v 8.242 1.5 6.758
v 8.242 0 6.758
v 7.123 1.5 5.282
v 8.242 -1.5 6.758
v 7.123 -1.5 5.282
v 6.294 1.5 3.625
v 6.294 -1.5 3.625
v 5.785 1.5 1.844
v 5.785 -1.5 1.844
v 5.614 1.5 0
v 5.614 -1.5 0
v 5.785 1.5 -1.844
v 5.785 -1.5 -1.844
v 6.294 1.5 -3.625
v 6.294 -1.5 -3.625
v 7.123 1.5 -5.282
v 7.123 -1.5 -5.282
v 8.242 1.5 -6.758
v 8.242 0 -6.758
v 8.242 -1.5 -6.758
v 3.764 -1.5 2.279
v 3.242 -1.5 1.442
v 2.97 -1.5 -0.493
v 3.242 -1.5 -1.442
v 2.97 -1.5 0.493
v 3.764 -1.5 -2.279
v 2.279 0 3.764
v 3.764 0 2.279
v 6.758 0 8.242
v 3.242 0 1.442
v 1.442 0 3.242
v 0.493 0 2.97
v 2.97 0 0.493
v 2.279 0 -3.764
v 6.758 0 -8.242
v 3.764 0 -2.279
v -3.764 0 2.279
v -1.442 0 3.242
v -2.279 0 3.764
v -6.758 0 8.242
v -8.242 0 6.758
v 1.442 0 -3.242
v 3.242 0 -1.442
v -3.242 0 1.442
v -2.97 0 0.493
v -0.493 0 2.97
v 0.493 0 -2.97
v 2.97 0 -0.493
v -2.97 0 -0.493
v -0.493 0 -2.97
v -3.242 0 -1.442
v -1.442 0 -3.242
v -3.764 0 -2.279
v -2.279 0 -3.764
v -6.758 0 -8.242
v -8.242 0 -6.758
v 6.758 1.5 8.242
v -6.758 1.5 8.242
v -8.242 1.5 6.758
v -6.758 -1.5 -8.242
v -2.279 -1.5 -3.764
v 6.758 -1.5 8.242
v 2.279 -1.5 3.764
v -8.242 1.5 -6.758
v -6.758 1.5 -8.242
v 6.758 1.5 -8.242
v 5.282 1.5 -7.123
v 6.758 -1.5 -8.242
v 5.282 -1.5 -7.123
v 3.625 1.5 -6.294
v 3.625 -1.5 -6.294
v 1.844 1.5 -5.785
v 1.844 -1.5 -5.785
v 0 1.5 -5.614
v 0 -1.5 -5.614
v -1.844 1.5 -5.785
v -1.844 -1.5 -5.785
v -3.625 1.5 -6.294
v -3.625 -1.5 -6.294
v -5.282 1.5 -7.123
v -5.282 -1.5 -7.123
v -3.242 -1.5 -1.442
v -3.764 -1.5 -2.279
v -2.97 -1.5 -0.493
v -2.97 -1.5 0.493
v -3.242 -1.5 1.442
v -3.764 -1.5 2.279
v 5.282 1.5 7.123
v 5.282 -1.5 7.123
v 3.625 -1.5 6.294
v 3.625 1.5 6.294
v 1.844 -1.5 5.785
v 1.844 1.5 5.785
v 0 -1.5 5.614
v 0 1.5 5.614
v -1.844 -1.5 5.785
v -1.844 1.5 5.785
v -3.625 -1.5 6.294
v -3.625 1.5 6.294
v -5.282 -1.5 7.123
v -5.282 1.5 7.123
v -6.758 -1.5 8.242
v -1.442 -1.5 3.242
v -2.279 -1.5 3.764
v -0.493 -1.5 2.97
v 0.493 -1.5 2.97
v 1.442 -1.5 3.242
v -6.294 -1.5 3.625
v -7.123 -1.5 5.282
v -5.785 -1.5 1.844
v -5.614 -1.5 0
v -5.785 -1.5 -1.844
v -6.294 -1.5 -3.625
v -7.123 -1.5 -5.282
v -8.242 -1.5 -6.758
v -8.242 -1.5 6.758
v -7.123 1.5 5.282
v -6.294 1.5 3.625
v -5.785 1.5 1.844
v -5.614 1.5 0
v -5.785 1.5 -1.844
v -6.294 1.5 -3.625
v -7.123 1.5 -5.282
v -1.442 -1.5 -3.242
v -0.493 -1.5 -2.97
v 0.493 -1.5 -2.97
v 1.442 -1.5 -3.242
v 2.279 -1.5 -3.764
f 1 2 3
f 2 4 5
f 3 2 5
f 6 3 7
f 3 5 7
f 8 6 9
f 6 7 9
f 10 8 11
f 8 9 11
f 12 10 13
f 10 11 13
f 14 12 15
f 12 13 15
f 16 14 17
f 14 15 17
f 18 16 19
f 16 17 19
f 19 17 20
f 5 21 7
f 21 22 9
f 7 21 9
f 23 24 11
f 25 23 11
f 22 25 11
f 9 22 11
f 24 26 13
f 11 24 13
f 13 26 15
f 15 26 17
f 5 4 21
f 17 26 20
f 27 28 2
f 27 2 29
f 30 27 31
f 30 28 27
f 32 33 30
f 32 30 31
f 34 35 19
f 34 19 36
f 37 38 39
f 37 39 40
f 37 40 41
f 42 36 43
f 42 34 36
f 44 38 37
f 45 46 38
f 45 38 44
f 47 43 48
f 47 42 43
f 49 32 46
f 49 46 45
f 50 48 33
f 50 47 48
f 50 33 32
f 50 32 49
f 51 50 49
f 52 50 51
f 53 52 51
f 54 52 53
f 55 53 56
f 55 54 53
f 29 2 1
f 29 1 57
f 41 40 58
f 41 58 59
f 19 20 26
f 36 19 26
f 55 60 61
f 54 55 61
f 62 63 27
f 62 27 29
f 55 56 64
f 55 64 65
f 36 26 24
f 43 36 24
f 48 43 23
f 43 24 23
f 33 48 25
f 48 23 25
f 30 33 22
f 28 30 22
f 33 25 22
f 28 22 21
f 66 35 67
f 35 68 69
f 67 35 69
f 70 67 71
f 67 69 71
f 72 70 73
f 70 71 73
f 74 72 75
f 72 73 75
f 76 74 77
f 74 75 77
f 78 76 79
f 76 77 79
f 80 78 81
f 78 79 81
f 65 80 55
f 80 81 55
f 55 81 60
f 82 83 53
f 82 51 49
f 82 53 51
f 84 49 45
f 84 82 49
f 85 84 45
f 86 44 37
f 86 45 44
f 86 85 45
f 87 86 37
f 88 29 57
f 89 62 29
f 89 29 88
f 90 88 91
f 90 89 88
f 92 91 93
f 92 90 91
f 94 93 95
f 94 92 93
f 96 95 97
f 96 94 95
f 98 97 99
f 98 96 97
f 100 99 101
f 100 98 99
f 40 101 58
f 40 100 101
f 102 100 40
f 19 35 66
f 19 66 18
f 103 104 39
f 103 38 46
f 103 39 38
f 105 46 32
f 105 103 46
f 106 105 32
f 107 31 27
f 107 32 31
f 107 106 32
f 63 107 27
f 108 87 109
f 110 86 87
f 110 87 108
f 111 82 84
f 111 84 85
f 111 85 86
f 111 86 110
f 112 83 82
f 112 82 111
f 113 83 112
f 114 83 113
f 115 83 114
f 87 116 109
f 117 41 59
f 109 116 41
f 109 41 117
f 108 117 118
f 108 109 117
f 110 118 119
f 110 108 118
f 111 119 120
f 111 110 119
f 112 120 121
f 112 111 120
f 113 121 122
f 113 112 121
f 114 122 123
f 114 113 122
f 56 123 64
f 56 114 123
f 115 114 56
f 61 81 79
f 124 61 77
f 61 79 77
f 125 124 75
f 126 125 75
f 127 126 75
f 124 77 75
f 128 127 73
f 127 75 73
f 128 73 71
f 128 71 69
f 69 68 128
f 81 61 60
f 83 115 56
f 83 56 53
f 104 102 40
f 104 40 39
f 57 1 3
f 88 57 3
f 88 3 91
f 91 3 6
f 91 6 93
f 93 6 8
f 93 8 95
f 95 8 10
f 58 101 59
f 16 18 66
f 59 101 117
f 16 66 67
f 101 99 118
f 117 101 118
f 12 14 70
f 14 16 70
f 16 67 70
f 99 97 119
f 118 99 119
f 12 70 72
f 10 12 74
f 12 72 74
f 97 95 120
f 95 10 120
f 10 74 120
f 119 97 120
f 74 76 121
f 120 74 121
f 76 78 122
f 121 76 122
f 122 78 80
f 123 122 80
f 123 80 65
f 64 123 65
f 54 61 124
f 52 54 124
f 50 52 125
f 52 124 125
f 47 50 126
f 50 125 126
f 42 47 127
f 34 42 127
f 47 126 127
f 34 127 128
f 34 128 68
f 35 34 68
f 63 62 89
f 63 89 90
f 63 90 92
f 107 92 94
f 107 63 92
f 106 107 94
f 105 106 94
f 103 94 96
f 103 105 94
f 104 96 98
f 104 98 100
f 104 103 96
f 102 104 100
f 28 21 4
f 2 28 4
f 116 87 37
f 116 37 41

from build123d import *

# Parameters (mm, degrees)
BOSS_EXTRUDE1_DEPTH        = 1.5
BOSS_EXTRUDE1_DEPTH_BACK   = 1.5
BOSS_EXTRUDE1_2_DEPTH      = 1.5
BOSS_EXTRUDE1_2_DEPTH_BACK = 1.5
BOSS_EXTRUDE1_3_DEPTH      = 1.5
BOSS_EXTRUDE1_3_DEPTH_BACK = 1.5
BOSS_EXTRUDE1_4_DEPTH      = 1.5
BOSS_EXTRUDE1_4_DEPTH_BACK = 1.5
BOSS_EXTRUDE2_DEPTH        = 1.5


with BuildPart() as part:
    # Sketch1 → Boss-Extrude1 (new, two sides: drawn at the far end of the back side and taken through both)
    with BuildSketch(Plane(origin=(0, 0, 0), x_dir=(1, 0, 0), z_dir=(0, 1, 0)).offset(-BOSS_EXTRUDE1_DEPTH_BACK)):
        with BuildLine():
            Line((-3.764359918, 2.279435677), (-8.24246212, 6.75753788))
            ThreePointArc((-8.24246212, 6.75753788), (-5.613736217, 0), (-8.24246212, -6.75753788))
            Line((-8.24246212, -6.75753788), (-3.764359918, -2.279435677))
            ThreePointArc((-3.764359918, -2.279435677), (-2.935880264, 0), (-3.764359918, 2.279435677))
        make_face()
    extrude(amount=BOSS_EXTRUDE1_DEPTH + BOSS_EXTRUDE1_DEPTH_BACK)



with BuildPart() as body_2:
    # Sketch1 → Boss-Extrude1 2 (new, two sides: drawn at the far end of the back side and taken through both)
    with BuildSketch(Plane(origin=(0, 0, 0), x_dir=(1, 0, 0), z_dir=(0, 1, 0)).offset(-BOSS_EXTRUDE1_2_DEPTH_BACK)):
        with BuildLine():
            ThreePointArc((6.75753788, 8.24246212), (0, 5.613736217), (-6.75753788, 8.24246212))
            Line((-6.75753788, 8.24246212), (-2.279435677, 3.764359918))
            ThreePointArc((-2.279435677, 3.764359918), (0, 2.935880264), (2.279435677, 3.764359918))
            Line((2.279435677, 3.764359918), (6.75753788, 8.24246212))
        make_face()
    extrude(amount=BOSS_EXTRUDE1_2_DEPTH + BOSS_EXTRUDE1_2_DEPTH_BACK)


with BuildPart() as body_3:
    # Sketch1 → Boss-Extrude1 3 (new, two sides: drawn at the far end of the back side and taken through both)
    with BuildSketch(Plane(origin=(0, 0, 0), x_dir=(1, 0, 0), z_dir=(0, 1, 0)).offset(-BOSS_EXTRUDE1_3_DEPTH_BACK)):
        with BuildLine():
            Line((-2.279435677, -3.764359918), (-6.75753788, -8.24246212))
            ThreePointArc((-6.75753788, -8.24246212), (0, -5.613736217), (6.75753788, -8.24246212))
            Line((6.75753788, -8.24246212), (2.279435677, -3.764359918))
            ThreePointArc((2.279435677, -3.764359918), (0, -2.935880264), (-2.279435677, -3.764359918))
        make_face()
    extrude(amount=BOSS_EXTRUDE1_3_DEPTH + BOSS_EXTRUDE1_3_DEPTH_BACK)


with BuildPart() as body_4:
    # Sketch1 → Boss-Extrude1 4 (new, two sides: drawn at the far end of the back side and taken through both)
    with BuildSketch(Plane(origin=(0, 0, 0), x_dir=(1, 0, 0), z_dir=(0, 1, 0)).offset(-BOSS_EXTRUDE1_4_DEPTH_BACK)):
        with BuildLine():
            ThreePointArc((8.24246212, -6.75753788), (5.613736217, 0), (8.24246212, 6.75753788))
            Line((8.24246212, 6.75753788), (3.764359918, 2.279435677))
            ThreePointArc((3.764359918, 2.279435677), (2.935880264, 0), (3.764359918, -2.279435677))
            Line((3.764359918, -2.279435677), (8.24246212, -6.75753788))
        make_face()
    extrude(amount=BOSS_EXTRUDE1_4_DEPTH + BOSS_EXTRUDE1_4_DEPTH_BACK)


with BuildPart() as part_1:
    add(part.part)

    add(body_2.part)  # Boss-Extrude2 merges body 2

    add(body_3.part)  # Boss-Extrude2 merges body 3

    add(body_4.part)  # Boss-Extrude2 merges body 4
    # Sketch1<4> → Boss-Extrude2 (add)
    with BuildSketch(Plane(origin=(0, 0, 0), x_dir=(1, 0, 0), z_dir=(0, 1, 0))):
        with BuildLine():
            Line((-6.75753788, 8.24246212), (-8.24246212, 6.75753788))
            Line((-8.24246212, 6.75753788), (-3.764359918, 2.279435677))
            ThreePointArc((-3.764359918, 2.279435677), (-2.935880264, 0), (-3.764359918, -2.279435677))
            Line((-3.764359918, -2.279435677), (-8.24246212, -6.75753788))
            Line((-8.24246212, -6.75753788), (-6.75753788, -8.24246212))
            Line((-6.75753788, -8.24246212), (-2.279435677, -3.764359918))
            ThreePointArc((-2.279435677, -3.764359918), (0, -2.935880264), (2.279435677, -3.764359918))
            Line((2.279435677, -3.764359918), (6.75753788, -8.24246212))
            Line((6.75753788, -8.24246212), (8.24246212, -6.75753788))
            Line((8.24246212, -6.75753788), (3.764359918, -2.279435677))
            ThreePointArc((3.764359918, -2.279435677), (2.935880264, 0), (3.764359918, 2.279435677))
            Line((3.764359918, 2.279435677), (8.24246212, 6.75753788))
            Line((8.24246212, 6.75753788), (6.75753788, 8.24246212))
            Line((6.75753788, 8.24246212), (2.279435677, 3.764359918))
            ThreePointArc((2.279435677, 3.764359918), (0, 2.935880264), (-2.279435677, 3.764359918))
            Line((-2.279435677, 3.764359918), (-6.75753788, 8.24246212))
        make_face()
    extrude(amount=BOSS_EXTRUDE2_DEPTH)


solid = part_1.part
